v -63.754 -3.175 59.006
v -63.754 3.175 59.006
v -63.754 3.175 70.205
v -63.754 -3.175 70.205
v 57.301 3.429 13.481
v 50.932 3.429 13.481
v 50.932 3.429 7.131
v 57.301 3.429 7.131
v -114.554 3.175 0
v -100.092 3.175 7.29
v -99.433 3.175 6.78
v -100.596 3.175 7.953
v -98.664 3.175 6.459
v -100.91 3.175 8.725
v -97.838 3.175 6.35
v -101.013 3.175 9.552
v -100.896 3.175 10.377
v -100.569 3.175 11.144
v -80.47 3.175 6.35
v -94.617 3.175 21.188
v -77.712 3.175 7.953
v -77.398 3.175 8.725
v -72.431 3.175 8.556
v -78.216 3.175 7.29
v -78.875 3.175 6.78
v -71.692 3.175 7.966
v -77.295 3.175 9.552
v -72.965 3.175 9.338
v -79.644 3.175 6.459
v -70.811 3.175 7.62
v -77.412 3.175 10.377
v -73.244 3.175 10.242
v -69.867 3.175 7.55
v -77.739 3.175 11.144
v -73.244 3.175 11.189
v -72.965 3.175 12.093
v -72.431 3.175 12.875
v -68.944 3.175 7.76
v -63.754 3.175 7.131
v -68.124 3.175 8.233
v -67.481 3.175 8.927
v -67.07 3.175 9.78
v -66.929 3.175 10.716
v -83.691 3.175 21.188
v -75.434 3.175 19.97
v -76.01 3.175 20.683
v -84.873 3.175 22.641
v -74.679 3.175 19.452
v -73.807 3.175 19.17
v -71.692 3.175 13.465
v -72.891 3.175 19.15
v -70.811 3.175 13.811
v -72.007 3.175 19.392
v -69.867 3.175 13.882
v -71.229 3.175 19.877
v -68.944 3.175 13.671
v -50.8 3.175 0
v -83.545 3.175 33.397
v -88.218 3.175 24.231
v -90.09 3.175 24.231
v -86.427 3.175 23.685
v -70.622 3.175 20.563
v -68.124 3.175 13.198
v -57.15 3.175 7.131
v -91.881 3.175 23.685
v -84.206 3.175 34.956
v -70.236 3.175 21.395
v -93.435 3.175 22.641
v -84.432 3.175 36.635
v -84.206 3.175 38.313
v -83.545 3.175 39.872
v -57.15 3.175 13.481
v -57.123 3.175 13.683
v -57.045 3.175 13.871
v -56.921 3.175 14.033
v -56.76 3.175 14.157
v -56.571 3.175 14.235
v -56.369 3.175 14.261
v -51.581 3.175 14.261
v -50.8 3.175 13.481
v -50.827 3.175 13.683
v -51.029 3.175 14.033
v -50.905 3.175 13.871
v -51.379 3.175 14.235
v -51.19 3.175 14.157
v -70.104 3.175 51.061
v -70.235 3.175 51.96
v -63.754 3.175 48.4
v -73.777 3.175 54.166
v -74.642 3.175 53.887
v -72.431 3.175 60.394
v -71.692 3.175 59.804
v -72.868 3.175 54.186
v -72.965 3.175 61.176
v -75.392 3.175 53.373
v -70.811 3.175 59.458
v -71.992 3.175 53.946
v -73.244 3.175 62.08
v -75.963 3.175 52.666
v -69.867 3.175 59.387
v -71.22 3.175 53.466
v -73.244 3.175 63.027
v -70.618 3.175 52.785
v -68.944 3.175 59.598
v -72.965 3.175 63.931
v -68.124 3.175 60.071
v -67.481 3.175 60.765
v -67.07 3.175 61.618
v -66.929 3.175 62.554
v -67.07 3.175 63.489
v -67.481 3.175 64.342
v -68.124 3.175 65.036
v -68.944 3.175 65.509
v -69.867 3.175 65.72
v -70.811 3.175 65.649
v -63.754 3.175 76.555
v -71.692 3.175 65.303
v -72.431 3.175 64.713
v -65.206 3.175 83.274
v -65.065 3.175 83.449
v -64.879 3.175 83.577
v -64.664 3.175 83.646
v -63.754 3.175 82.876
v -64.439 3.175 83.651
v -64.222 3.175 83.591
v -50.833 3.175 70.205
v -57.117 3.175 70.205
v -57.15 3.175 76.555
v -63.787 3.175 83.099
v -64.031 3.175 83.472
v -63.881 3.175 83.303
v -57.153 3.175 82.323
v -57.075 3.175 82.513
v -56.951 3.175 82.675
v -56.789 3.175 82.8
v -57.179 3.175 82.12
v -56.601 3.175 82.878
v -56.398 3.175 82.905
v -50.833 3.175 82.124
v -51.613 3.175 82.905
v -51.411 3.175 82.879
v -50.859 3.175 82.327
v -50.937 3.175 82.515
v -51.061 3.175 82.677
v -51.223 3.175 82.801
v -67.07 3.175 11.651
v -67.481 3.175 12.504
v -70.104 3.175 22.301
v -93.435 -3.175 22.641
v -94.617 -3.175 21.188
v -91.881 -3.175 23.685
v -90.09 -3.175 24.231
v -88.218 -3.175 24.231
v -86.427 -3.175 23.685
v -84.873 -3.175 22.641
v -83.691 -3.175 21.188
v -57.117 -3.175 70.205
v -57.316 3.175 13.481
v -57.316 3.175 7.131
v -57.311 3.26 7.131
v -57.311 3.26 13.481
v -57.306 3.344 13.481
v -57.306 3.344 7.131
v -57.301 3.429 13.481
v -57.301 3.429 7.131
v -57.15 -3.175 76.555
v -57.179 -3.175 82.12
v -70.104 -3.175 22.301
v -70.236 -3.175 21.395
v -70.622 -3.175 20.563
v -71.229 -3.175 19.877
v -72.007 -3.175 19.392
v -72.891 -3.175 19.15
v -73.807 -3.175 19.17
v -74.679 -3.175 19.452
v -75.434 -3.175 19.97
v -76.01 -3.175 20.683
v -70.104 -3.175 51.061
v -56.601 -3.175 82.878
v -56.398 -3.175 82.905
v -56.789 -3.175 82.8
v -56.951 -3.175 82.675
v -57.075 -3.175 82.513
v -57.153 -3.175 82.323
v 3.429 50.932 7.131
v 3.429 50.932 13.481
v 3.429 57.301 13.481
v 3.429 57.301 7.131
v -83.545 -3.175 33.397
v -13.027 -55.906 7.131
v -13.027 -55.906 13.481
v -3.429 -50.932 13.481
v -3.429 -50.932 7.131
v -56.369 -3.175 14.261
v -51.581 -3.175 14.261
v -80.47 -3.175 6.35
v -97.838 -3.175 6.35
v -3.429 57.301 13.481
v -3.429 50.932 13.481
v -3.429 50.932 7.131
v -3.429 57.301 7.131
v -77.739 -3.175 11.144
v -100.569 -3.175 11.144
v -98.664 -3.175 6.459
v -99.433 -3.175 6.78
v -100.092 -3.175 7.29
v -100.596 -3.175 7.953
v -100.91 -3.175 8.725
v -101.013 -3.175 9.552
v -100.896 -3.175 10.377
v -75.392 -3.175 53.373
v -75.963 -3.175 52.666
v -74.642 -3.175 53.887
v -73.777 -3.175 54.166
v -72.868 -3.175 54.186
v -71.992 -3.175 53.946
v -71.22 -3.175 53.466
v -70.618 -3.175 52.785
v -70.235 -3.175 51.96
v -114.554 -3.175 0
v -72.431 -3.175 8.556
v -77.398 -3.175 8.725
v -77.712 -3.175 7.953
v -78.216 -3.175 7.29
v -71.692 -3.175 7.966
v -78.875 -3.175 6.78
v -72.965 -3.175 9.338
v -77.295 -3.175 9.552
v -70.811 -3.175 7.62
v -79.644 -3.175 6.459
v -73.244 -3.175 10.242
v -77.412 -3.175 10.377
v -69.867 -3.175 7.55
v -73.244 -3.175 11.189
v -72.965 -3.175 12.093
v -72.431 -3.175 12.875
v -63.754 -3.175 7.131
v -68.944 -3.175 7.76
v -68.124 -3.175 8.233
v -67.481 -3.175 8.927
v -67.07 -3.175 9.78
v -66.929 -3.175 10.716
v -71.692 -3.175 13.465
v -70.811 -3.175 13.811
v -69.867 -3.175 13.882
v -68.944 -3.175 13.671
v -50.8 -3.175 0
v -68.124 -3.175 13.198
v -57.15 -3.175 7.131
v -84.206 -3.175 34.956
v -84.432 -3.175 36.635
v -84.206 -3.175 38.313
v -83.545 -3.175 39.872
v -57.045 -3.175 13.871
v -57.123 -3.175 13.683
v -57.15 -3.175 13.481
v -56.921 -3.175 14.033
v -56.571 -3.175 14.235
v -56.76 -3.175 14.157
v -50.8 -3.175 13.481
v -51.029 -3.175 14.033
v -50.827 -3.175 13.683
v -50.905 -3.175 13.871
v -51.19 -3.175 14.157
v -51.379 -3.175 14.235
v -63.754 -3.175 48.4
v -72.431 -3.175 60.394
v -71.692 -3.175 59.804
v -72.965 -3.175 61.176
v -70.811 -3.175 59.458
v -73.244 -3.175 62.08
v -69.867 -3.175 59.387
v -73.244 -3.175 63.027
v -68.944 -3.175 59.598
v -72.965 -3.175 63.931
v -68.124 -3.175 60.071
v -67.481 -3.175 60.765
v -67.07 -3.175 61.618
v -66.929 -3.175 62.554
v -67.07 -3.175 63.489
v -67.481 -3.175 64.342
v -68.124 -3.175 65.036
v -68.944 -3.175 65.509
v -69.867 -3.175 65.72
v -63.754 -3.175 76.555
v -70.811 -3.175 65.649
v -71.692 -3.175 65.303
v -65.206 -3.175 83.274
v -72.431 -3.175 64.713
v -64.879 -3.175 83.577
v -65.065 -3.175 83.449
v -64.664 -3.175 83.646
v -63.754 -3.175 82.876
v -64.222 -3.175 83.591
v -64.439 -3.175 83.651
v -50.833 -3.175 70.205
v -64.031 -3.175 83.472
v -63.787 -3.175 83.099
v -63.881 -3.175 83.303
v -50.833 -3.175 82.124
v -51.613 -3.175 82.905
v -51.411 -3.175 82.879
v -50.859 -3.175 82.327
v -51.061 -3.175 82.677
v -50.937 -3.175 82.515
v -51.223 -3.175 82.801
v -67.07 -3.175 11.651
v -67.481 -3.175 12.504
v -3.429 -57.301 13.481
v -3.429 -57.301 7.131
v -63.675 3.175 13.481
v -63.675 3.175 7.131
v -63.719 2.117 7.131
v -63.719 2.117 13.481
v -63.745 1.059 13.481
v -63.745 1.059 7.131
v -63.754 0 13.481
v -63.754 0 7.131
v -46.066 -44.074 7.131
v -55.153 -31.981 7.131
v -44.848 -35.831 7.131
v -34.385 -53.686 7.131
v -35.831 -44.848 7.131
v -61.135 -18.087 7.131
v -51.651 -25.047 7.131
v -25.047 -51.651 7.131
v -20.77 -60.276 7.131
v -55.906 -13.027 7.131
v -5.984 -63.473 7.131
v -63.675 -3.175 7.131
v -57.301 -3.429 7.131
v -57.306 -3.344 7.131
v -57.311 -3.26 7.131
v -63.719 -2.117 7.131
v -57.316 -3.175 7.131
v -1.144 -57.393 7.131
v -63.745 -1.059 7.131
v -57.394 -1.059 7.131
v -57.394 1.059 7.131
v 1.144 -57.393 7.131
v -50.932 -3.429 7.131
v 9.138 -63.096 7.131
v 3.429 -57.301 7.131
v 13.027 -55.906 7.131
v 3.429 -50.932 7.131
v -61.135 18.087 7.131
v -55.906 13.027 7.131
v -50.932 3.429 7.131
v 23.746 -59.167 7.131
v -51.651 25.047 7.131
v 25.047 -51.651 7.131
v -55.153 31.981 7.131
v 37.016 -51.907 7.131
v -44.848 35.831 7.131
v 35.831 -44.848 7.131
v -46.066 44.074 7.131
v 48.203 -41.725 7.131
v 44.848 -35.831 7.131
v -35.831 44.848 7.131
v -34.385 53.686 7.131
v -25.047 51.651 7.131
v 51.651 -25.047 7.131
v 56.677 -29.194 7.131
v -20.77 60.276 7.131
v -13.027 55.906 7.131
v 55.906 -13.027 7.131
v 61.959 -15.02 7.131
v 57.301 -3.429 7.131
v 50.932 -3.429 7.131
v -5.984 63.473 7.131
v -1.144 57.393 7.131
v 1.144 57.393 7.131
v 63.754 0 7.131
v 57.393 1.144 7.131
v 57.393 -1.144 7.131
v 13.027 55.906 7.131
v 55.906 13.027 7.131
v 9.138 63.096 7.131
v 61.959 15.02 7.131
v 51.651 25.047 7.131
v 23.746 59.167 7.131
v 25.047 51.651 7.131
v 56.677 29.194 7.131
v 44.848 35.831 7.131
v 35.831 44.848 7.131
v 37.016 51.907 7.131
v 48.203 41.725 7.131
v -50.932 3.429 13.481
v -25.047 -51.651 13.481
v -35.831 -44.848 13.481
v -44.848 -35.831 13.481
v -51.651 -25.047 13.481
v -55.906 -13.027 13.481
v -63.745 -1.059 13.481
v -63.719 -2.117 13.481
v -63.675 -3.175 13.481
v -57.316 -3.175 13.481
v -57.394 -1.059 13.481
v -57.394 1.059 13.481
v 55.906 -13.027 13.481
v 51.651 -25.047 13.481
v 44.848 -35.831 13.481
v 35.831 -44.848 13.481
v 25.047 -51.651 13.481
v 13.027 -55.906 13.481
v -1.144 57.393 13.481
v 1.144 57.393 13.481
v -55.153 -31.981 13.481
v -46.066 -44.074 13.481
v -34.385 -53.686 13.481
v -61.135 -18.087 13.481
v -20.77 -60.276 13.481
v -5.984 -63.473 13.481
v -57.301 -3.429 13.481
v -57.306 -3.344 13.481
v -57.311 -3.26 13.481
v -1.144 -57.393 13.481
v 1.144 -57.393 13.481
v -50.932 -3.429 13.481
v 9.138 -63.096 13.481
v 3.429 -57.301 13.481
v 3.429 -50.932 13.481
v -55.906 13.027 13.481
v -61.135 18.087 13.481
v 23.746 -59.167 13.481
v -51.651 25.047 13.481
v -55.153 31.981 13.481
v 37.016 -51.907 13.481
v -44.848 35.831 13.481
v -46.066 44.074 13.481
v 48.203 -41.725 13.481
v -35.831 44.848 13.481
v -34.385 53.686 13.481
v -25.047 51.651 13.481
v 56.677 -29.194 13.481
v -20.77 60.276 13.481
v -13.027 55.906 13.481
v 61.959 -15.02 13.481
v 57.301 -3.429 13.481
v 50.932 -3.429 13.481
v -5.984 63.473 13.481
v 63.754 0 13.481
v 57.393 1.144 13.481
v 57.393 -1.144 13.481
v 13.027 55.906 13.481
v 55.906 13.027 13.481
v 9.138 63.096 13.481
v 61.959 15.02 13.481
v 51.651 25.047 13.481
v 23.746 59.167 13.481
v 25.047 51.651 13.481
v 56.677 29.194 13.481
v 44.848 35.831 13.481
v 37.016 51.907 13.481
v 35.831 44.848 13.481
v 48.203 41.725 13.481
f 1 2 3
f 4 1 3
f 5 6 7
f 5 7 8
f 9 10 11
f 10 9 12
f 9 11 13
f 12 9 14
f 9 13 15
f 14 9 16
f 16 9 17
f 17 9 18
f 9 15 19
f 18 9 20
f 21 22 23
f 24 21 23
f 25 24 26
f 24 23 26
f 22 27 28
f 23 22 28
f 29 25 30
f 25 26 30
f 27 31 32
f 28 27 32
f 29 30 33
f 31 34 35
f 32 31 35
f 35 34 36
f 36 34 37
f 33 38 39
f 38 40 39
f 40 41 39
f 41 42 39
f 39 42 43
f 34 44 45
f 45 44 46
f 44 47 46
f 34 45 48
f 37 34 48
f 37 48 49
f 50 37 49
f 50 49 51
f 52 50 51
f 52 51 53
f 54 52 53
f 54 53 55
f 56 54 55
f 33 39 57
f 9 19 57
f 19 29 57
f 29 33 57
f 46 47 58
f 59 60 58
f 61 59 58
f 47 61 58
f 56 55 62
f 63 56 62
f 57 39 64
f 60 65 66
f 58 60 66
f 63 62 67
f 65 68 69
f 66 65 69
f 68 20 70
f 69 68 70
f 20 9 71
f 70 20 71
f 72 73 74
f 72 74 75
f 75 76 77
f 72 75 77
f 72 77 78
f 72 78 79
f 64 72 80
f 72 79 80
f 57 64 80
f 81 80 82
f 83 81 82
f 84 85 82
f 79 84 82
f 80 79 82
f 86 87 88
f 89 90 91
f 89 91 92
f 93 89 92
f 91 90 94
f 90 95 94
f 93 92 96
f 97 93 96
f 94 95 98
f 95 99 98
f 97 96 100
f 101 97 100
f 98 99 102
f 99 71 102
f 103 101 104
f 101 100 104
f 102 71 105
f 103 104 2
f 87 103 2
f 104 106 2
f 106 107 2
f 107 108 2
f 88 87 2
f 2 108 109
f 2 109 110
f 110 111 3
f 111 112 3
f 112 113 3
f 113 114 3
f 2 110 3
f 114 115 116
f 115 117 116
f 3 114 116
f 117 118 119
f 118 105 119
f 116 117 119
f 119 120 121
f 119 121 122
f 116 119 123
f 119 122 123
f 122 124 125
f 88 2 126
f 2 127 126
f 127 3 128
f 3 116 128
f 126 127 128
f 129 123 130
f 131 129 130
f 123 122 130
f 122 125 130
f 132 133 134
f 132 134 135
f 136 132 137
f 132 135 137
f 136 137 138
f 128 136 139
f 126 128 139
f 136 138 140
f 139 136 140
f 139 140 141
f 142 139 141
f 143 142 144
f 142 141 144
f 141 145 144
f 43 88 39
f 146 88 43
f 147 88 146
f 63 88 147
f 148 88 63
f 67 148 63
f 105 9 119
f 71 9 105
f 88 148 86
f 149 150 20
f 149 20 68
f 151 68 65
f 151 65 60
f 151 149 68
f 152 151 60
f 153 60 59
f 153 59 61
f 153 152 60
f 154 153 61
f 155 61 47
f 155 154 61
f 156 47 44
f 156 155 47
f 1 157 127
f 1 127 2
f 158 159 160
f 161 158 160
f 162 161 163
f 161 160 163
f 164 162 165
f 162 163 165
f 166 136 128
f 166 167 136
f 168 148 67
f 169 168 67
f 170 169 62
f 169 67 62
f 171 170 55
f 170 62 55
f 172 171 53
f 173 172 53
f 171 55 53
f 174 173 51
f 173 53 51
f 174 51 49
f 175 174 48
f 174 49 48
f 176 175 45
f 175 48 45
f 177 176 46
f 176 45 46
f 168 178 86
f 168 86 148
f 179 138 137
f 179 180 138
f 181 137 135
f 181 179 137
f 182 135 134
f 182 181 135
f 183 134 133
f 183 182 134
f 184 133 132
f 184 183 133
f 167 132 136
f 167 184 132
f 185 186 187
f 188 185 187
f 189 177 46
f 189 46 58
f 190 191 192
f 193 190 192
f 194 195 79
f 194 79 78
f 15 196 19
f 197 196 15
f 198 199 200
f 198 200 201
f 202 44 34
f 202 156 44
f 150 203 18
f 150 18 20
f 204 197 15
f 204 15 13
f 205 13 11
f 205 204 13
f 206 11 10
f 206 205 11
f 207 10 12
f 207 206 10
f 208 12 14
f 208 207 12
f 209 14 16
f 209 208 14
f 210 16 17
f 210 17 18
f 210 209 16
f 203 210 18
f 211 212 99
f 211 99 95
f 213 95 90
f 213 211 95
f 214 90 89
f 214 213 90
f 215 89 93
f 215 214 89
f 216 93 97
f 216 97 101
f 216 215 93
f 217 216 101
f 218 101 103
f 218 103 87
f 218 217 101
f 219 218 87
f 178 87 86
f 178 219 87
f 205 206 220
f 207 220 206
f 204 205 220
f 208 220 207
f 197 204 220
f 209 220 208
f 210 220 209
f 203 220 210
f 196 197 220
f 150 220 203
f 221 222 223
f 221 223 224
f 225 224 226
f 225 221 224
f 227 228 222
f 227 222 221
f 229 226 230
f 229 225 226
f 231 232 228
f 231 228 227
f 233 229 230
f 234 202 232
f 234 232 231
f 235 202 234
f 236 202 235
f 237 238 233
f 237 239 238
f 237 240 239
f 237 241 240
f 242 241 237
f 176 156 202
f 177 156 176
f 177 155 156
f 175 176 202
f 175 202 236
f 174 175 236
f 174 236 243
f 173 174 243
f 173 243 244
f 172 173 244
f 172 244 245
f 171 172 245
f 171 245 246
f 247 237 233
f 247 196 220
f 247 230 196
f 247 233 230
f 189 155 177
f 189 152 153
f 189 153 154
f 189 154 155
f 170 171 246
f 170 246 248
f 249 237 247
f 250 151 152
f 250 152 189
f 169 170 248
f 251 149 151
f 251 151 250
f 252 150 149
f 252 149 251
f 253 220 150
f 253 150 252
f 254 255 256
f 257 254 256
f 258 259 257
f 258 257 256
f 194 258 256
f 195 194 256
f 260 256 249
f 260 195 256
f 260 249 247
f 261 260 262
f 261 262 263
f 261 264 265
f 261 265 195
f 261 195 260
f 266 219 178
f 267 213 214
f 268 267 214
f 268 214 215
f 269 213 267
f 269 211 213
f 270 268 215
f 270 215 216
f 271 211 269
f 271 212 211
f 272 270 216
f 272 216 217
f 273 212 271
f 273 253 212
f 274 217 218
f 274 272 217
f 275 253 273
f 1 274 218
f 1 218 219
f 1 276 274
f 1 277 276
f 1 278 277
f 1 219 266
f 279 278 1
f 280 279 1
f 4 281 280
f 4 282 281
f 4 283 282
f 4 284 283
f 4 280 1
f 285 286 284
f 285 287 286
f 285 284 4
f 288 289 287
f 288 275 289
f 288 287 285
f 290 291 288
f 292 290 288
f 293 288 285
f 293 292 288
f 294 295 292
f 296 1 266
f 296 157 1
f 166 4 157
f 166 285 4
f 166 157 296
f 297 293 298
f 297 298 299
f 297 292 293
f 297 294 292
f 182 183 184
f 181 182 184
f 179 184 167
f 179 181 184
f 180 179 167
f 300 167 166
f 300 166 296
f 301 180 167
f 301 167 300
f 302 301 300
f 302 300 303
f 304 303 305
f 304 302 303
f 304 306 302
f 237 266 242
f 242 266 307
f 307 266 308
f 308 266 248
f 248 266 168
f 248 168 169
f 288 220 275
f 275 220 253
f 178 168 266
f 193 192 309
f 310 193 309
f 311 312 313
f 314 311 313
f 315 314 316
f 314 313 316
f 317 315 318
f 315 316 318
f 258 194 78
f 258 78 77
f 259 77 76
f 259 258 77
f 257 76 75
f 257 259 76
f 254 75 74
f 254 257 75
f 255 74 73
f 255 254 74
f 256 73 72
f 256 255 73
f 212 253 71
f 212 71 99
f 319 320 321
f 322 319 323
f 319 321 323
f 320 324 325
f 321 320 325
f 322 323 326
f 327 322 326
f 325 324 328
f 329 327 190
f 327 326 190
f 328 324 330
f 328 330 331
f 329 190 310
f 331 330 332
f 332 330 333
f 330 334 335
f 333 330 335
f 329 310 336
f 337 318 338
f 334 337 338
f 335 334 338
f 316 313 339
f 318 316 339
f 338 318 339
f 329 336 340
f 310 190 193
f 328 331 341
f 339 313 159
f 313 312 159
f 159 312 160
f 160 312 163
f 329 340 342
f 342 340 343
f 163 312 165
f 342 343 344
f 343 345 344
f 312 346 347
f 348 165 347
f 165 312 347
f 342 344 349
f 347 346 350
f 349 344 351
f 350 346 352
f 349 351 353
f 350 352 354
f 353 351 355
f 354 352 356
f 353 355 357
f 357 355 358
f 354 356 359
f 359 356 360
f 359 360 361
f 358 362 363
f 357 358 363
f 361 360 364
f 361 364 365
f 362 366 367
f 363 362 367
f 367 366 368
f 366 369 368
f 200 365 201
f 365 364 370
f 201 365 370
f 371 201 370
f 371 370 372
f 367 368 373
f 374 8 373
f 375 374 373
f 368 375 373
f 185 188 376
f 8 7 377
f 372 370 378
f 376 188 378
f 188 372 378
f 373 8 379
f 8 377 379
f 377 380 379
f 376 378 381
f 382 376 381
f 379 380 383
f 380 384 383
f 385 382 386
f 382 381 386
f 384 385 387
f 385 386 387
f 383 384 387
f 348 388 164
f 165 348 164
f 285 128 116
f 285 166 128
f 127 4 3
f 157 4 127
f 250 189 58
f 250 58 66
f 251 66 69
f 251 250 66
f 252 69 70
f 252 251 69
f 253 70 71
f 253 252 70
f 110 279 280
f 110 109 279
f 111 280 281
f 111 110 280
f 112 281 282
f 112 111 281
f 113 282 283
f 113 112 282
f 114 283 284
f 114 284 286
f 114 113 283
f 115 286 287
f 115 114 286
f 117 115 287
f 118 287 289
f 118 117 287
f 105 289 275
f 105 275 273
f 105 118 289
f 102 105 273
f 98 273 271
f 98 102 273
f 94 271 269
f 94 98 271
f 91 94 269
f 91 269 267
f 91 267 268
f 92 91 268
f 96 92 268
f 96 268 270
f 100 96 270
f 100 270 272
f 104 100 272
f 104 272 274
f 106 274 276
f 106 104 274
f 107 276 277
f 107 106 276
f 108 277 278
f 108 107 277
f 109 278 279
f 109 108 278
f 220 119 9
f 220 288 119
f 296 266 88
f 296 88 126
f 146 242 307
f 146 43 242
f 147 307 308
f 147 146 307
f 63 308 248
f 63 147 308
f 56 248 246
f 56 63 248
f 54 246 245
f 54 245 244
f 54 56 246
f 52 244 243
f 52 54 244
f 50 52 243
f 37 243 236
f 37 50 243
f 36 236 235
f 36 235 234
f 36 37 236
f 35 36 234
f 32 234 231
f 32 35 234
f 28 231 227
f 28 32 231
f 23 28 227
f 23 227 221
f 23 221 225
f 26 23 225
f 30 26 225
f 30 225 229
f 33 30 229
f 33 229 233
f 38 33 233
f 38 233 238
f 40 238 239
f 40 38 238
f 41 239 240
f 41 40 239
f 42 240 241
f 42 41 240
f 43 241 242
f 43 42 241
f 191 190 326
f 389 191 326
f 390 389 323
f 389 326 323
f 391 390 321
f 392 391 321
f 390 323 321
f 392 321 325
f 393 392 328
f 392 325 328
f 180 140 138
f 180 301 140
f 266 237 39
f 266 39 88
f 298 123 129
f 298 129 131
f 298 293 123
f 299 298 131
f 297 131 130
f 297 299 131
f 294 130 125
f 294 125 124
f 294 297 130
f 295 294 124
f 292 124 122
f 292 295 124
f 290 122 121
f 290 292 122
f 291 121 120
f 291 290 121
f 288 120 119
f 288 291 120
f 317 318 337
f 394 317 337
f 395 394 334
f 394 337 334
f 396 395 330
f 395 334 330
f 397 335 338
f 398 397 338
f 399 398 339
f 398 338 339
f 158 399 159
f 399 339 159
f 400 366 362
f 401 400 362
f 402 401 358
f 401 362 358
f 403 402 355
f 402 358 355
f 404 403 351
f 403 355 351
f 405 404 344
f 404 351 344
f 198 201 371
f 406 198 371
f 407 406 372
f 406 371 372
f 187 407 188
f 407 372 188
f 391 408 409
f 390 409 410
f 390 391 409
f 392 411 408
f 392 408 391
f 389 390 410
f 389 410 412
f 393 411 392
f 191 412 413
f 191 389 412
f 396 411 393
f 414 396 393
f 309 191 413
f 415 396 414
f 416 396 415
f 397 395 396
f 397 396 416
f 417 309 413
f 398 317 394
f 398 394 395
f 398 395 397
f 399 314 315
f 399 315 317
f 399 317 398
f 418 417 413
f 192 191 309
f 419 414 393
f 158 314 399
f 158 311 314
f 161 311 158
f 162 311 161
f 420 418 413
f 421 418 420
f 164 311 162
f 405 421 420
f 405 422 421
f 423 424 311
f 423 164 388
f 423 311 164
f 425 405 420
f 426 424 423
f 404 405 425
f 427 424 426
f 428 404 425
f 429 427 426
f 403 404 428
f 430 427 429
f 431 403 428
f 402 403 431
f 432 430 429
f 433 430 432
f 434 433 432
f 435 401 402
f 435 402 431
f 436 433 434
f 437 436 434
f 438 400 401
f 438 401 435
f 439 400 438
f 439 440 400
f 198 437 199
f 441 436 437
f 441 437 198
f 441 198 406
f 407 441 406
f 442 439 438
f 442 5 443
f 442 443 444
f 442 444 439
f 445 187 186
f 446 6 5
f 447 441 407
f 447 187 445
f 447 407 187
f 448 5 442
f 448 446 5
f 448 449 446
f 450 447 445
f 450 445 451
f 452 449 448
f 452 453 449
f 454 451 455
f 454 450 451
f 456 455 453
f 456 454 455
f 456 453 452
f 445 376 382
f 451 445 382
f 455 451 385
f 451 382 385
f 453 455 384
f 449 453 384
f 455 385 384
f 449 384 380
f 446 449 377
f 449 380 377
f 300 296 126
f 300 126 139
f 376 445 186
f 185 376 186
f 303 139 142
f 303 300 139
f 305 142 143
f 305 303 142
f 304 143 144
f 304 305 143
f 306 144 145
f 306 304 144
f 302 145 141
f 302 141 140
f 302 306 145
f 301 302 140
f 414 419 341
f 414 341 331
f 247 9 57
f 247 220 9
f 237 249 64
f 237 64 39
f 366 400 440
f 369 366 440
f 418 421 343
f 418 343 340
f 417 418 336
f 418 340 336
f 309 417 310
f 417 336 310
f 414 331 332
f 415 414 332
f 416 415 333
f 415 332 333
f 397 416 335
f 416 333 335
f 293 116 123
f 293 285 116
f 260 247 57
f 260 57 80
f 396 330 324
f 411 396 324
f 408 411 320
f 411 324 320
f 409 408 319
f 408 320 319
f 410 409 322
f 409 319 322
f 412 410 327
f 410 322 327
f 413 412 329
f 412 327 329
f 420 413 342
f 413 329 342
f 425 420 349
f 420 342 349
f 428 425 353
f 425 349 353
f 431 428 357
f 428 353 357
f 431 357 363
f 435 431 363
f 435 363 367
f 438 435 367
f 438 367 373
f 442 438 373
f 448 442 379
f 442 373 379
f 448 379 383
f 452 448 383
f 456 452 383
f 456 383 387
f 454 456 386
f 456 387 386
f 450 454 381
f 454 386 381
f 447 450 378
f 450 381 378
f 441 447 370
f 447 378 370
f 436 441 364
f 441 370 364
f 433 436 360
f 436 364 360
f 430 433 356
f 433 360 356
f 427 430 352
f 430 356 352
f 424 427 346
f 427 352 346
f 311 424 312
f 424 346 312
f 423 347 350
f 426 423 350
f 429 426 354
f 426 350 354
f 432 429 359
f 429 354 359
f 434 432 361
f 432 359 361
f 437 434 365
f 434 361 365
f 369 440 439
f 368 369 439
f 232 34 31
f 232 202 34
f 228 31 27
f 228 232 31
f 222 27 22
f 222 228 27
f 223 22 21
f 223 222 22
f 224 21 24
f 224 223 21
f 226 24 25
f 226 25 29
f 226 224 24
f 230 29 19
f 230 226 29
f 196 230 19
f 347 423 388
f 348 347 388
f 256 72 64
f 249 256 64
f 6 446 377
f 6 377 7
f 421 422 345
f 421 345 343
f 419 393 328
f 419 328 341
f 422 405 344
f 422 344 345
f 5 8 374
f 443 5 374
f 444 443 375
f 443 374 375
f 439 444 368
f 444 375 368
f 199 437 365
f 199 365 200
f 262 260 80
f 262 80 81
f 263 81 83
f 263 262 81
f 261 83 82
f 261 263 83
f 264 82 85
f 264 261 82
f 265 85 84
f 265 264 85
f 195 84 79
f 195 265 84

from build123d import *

# Parameters (mm, degrees)
F0_R            = 3.175
F1_DEPTH        = 3.175
F3_DEPTH        = 6.35
F6_DEPTH        = 6.35
F6_COPIES_COUNT = 4


# Not quite as in the source:
# - a pattern or mirror of a feature is missing from the dataset's text; its kind, count and spacing are read off the source's solid


with BuildPart() as f1:
    # F0 (on Front) → F1 (new body, symmetric)
    with BuildSketch(Plane.XZ):
        with BuildLine():
            Line((-114.554, 0), (-63.754, 0))
            Line((-63.754, 0), (-57.15, 0))
            Line((-57.15, 0), (-50.8, 0))
            Line((-50.8, 0), (-50.8, 7.1307474974))
            Line((-50.8, 7.1307474974), (-50.8, 13.4807474974))
            ThreePointArc((-50.8, 13.4807474974), (-51.0286756476, 14.0328193472), (-51.5807474974, 14.2614949948))
            Line((-51.5807474974, 14.2614949948), (-56.3692525026, 14.2614949948))
            ThreePointArc((-56.3692525026, 14.2614949948), (-56.9213243524, 14.0328193472), (-57.15, 13.4807474974))
            Line((-57.15, 13.4807474974), (-57.15, 7.1307474974))
            Line((-57.15, 7.1307474974), (-63.754, 7.1307474974))
            Line((-63.754, 7.1307474974), (-63.754, 48.4004353356))
            Line((-63.754, 48.4004353356), (-50.832637261, 70.2052349577))
            Line((-50.832637261, 70.2052349577), (-50.832637261, 82.1244455233))
            ThreePointArc((-50.832637261, 82.1244455233), (-51.0613129086, 82.6765173731), (-51.6133847584, 82.9051930207))
            Line((-51.6133847584, 82.9051930207), (-56.3978665697, 82.9051930207))
            ThreePointArc((-56.3978665697, 82.9051930207), (-56.9513553502, 82.6750967964), (-57.1786037546, 82.120432695))
            Line((-57.1786037546, 82.120432695), (-57.15, 76.5552768946))
            Line((-57.15, 76.5552768946), (-63.754, 76.5552768946))
            Line((-63.754, 76.5552768946), (-63.754, 82.8760177533))
            ThreePointArc((-63.754, 82.8760177533), (-64.3283963131, 83.629002377), (-65.2064179593, 83.2740446937))
            Line((-65.2064179593, 83.2740446937), (-114.554, 0))
        make_face()
        with BuildLine():
            ThreePointArc((-97.837727428, 6.35), (-100.5963277724, 7.9531383205), (-100.5691530473, 11.1436225892))
            Line((-100.5691530473, 11.1436225892), (-94.6168512386, 21.1881318914))
            ThreePointArc((-94.6168512386, 21.1881318914), (-89.154, 24.300886713), (-83.6911487614, 21.1881318914))
            Line((-83.6911487614, 21.1881318914), (-77.7388469527, 11.1436225892))
            ThreePointArc((-77.7388469527, 11.1436225892), (-77.7116722276, 7.9531383205), (-80.470272572, 6.35))
            Line((-80.470272572, 6.35), (-97.837727428, 6.35))
        make_face(mode=Mode.SUBTRACT)
        with Locations((-70.104, 10.715625)):
            Circle(F0_R, mode=Mode.SUBTRACT)
        with BuildLine():
            ThreePointArc((-75.9631742143, 52.6662118698), (-72.4211622502, 54.0981405316), (-70.104, 51.0605382613))
            Line((-70.104, 51.0605382613), (-70.104, 22.3013408218))
            ThreePointArc((-70.104, 22.3013408218), (-72.4398490426, 19.2392417589), (-76.0104256193, 20.6827182325))
            Line((-76.0104256193, 20.6827182325), (-83.545023111, 33.3973514998))
            ThreePointArc((-83.545023111, 33.3973514998), (-84.4321718724, 36.6345966782), (-83.545023111, 39.8718418567))
            Line((-83.545023111, 39.8718418567), (-75.9631742143, 52.6662118698))
        make_face(mode=Mode.SUBTRACT)
        with Locations((-70.104, 62.5535683565)):
            Circle(F0_R, mode=Mode.SUBTRACT)
        Polygon((-63.754, 59.0059507892), (-63.754, 70.2052768946), (-57.1173623079, 70.2052768946), align=None, mode=Mode.SUBTRACT)
    extrude(amount=F1_DEPTH, both=True)


with BuildPart() as f3:
    # F2 (on face) → F3 (new body)
    with BuildSketch(Plane.XY.offset(7.1307474974)):
        with BuildLine():
            ThreePointArc((-63.6748921554, -3.175), (1.5879926835, -63.7342199704), (63.754, 0))
            ThreePointArc((63.754, 0), (1.5879926835, 63.7342199704), (-63.6748921554, 3.175))
            Line((-63.6748921554, 3.175), (-57.3161288542, 3.175))
            ThreePointArc((-57.3161288542, 3.175), (1.5881078673, 57.3820282426), (57.4040003121, 0))
            ThreePointArc((57.4040003121, 0), (1.5881078673, -57.3820282426), (-57.3161288542, -3.175))
            Line((-57.3161288542, -3.175), (-63.6748921554, -3.175))
        make_face()
        with BuildLine():
            Line((-57.3161288542, 3.175), (-63.6748921554, 3.175))
            ThreePointArc((-63.6748921554, 3.175), (-63.7342199704, 1.5879926835), (-63.754, 0))
            ThreePointArc((-63.754, 0), (-63.7342199704, -1.5879926835), (-63.6748921554, -3.175))
            Line((-63.6748921554, -3.175), (-57.3161288542, -3.175))
            ThreePointArc((-57.3161288542, -3.175), (-57.4040003121, 0), (-57.3161288542, 3.175))
        make_face()
    extrude(amount=F3_DEPTH)

    # F5 (on face) → F6 (join, through all)
    with BuildSketch(Plane.XY.offset(13.4807474974)):
        with BuildLine():
            Line((-50.9316508603, -3.429), (-57.3014939668, -3.429))
            ThreePointArc((-57.3014939668, -3.429), (-56.806984466, -8.2574673909), (-55.9063426191, -13.0268993544))
            Line((-55.9063426191, -13.0268993544), (-50.9316508603, -3.429))
        make_face()
    f6 = extrude(amount=-F6_DEPTH)

    # F6_copies: F6 ×4 about axis
    f6_copies_axis = Axis((0, 0, 0), (0, 0, 1))
    for i in range(1, F6_COPIES_COUNT):
        add(f6.rotate(f6_copies_axis, i * 360 / F6_COPIES_COUNT))

    # F6_copies1: F6 across plane
    add(f6.mirror(Plane(origin=(0, 0, 0), x_dir=(0, 0, 1), z_dir=(1, 0, 0))))

    # F6_copies2: F6 across plane
    add(f6.mirror(Plane(origin=(0, 0, 0), x_dir=(-0.7071067812, -0.7071067812, 0), z_dir=(0.7071067812, -0.7071067812, 0))))

    # F6_copies3: F6 across plane
    add(f6.mirror(Plane(origin=(0, 0, 0), x_dir=(0.7071067812, -0.7071067812, 0), z_dir=(0.7071067812, 0.7071067812, 0))))

    # F6_copies4: F6 across plane
    add(f6.mirror(Plane.ZX))


solid = Compound([f1.part, f3.part])
